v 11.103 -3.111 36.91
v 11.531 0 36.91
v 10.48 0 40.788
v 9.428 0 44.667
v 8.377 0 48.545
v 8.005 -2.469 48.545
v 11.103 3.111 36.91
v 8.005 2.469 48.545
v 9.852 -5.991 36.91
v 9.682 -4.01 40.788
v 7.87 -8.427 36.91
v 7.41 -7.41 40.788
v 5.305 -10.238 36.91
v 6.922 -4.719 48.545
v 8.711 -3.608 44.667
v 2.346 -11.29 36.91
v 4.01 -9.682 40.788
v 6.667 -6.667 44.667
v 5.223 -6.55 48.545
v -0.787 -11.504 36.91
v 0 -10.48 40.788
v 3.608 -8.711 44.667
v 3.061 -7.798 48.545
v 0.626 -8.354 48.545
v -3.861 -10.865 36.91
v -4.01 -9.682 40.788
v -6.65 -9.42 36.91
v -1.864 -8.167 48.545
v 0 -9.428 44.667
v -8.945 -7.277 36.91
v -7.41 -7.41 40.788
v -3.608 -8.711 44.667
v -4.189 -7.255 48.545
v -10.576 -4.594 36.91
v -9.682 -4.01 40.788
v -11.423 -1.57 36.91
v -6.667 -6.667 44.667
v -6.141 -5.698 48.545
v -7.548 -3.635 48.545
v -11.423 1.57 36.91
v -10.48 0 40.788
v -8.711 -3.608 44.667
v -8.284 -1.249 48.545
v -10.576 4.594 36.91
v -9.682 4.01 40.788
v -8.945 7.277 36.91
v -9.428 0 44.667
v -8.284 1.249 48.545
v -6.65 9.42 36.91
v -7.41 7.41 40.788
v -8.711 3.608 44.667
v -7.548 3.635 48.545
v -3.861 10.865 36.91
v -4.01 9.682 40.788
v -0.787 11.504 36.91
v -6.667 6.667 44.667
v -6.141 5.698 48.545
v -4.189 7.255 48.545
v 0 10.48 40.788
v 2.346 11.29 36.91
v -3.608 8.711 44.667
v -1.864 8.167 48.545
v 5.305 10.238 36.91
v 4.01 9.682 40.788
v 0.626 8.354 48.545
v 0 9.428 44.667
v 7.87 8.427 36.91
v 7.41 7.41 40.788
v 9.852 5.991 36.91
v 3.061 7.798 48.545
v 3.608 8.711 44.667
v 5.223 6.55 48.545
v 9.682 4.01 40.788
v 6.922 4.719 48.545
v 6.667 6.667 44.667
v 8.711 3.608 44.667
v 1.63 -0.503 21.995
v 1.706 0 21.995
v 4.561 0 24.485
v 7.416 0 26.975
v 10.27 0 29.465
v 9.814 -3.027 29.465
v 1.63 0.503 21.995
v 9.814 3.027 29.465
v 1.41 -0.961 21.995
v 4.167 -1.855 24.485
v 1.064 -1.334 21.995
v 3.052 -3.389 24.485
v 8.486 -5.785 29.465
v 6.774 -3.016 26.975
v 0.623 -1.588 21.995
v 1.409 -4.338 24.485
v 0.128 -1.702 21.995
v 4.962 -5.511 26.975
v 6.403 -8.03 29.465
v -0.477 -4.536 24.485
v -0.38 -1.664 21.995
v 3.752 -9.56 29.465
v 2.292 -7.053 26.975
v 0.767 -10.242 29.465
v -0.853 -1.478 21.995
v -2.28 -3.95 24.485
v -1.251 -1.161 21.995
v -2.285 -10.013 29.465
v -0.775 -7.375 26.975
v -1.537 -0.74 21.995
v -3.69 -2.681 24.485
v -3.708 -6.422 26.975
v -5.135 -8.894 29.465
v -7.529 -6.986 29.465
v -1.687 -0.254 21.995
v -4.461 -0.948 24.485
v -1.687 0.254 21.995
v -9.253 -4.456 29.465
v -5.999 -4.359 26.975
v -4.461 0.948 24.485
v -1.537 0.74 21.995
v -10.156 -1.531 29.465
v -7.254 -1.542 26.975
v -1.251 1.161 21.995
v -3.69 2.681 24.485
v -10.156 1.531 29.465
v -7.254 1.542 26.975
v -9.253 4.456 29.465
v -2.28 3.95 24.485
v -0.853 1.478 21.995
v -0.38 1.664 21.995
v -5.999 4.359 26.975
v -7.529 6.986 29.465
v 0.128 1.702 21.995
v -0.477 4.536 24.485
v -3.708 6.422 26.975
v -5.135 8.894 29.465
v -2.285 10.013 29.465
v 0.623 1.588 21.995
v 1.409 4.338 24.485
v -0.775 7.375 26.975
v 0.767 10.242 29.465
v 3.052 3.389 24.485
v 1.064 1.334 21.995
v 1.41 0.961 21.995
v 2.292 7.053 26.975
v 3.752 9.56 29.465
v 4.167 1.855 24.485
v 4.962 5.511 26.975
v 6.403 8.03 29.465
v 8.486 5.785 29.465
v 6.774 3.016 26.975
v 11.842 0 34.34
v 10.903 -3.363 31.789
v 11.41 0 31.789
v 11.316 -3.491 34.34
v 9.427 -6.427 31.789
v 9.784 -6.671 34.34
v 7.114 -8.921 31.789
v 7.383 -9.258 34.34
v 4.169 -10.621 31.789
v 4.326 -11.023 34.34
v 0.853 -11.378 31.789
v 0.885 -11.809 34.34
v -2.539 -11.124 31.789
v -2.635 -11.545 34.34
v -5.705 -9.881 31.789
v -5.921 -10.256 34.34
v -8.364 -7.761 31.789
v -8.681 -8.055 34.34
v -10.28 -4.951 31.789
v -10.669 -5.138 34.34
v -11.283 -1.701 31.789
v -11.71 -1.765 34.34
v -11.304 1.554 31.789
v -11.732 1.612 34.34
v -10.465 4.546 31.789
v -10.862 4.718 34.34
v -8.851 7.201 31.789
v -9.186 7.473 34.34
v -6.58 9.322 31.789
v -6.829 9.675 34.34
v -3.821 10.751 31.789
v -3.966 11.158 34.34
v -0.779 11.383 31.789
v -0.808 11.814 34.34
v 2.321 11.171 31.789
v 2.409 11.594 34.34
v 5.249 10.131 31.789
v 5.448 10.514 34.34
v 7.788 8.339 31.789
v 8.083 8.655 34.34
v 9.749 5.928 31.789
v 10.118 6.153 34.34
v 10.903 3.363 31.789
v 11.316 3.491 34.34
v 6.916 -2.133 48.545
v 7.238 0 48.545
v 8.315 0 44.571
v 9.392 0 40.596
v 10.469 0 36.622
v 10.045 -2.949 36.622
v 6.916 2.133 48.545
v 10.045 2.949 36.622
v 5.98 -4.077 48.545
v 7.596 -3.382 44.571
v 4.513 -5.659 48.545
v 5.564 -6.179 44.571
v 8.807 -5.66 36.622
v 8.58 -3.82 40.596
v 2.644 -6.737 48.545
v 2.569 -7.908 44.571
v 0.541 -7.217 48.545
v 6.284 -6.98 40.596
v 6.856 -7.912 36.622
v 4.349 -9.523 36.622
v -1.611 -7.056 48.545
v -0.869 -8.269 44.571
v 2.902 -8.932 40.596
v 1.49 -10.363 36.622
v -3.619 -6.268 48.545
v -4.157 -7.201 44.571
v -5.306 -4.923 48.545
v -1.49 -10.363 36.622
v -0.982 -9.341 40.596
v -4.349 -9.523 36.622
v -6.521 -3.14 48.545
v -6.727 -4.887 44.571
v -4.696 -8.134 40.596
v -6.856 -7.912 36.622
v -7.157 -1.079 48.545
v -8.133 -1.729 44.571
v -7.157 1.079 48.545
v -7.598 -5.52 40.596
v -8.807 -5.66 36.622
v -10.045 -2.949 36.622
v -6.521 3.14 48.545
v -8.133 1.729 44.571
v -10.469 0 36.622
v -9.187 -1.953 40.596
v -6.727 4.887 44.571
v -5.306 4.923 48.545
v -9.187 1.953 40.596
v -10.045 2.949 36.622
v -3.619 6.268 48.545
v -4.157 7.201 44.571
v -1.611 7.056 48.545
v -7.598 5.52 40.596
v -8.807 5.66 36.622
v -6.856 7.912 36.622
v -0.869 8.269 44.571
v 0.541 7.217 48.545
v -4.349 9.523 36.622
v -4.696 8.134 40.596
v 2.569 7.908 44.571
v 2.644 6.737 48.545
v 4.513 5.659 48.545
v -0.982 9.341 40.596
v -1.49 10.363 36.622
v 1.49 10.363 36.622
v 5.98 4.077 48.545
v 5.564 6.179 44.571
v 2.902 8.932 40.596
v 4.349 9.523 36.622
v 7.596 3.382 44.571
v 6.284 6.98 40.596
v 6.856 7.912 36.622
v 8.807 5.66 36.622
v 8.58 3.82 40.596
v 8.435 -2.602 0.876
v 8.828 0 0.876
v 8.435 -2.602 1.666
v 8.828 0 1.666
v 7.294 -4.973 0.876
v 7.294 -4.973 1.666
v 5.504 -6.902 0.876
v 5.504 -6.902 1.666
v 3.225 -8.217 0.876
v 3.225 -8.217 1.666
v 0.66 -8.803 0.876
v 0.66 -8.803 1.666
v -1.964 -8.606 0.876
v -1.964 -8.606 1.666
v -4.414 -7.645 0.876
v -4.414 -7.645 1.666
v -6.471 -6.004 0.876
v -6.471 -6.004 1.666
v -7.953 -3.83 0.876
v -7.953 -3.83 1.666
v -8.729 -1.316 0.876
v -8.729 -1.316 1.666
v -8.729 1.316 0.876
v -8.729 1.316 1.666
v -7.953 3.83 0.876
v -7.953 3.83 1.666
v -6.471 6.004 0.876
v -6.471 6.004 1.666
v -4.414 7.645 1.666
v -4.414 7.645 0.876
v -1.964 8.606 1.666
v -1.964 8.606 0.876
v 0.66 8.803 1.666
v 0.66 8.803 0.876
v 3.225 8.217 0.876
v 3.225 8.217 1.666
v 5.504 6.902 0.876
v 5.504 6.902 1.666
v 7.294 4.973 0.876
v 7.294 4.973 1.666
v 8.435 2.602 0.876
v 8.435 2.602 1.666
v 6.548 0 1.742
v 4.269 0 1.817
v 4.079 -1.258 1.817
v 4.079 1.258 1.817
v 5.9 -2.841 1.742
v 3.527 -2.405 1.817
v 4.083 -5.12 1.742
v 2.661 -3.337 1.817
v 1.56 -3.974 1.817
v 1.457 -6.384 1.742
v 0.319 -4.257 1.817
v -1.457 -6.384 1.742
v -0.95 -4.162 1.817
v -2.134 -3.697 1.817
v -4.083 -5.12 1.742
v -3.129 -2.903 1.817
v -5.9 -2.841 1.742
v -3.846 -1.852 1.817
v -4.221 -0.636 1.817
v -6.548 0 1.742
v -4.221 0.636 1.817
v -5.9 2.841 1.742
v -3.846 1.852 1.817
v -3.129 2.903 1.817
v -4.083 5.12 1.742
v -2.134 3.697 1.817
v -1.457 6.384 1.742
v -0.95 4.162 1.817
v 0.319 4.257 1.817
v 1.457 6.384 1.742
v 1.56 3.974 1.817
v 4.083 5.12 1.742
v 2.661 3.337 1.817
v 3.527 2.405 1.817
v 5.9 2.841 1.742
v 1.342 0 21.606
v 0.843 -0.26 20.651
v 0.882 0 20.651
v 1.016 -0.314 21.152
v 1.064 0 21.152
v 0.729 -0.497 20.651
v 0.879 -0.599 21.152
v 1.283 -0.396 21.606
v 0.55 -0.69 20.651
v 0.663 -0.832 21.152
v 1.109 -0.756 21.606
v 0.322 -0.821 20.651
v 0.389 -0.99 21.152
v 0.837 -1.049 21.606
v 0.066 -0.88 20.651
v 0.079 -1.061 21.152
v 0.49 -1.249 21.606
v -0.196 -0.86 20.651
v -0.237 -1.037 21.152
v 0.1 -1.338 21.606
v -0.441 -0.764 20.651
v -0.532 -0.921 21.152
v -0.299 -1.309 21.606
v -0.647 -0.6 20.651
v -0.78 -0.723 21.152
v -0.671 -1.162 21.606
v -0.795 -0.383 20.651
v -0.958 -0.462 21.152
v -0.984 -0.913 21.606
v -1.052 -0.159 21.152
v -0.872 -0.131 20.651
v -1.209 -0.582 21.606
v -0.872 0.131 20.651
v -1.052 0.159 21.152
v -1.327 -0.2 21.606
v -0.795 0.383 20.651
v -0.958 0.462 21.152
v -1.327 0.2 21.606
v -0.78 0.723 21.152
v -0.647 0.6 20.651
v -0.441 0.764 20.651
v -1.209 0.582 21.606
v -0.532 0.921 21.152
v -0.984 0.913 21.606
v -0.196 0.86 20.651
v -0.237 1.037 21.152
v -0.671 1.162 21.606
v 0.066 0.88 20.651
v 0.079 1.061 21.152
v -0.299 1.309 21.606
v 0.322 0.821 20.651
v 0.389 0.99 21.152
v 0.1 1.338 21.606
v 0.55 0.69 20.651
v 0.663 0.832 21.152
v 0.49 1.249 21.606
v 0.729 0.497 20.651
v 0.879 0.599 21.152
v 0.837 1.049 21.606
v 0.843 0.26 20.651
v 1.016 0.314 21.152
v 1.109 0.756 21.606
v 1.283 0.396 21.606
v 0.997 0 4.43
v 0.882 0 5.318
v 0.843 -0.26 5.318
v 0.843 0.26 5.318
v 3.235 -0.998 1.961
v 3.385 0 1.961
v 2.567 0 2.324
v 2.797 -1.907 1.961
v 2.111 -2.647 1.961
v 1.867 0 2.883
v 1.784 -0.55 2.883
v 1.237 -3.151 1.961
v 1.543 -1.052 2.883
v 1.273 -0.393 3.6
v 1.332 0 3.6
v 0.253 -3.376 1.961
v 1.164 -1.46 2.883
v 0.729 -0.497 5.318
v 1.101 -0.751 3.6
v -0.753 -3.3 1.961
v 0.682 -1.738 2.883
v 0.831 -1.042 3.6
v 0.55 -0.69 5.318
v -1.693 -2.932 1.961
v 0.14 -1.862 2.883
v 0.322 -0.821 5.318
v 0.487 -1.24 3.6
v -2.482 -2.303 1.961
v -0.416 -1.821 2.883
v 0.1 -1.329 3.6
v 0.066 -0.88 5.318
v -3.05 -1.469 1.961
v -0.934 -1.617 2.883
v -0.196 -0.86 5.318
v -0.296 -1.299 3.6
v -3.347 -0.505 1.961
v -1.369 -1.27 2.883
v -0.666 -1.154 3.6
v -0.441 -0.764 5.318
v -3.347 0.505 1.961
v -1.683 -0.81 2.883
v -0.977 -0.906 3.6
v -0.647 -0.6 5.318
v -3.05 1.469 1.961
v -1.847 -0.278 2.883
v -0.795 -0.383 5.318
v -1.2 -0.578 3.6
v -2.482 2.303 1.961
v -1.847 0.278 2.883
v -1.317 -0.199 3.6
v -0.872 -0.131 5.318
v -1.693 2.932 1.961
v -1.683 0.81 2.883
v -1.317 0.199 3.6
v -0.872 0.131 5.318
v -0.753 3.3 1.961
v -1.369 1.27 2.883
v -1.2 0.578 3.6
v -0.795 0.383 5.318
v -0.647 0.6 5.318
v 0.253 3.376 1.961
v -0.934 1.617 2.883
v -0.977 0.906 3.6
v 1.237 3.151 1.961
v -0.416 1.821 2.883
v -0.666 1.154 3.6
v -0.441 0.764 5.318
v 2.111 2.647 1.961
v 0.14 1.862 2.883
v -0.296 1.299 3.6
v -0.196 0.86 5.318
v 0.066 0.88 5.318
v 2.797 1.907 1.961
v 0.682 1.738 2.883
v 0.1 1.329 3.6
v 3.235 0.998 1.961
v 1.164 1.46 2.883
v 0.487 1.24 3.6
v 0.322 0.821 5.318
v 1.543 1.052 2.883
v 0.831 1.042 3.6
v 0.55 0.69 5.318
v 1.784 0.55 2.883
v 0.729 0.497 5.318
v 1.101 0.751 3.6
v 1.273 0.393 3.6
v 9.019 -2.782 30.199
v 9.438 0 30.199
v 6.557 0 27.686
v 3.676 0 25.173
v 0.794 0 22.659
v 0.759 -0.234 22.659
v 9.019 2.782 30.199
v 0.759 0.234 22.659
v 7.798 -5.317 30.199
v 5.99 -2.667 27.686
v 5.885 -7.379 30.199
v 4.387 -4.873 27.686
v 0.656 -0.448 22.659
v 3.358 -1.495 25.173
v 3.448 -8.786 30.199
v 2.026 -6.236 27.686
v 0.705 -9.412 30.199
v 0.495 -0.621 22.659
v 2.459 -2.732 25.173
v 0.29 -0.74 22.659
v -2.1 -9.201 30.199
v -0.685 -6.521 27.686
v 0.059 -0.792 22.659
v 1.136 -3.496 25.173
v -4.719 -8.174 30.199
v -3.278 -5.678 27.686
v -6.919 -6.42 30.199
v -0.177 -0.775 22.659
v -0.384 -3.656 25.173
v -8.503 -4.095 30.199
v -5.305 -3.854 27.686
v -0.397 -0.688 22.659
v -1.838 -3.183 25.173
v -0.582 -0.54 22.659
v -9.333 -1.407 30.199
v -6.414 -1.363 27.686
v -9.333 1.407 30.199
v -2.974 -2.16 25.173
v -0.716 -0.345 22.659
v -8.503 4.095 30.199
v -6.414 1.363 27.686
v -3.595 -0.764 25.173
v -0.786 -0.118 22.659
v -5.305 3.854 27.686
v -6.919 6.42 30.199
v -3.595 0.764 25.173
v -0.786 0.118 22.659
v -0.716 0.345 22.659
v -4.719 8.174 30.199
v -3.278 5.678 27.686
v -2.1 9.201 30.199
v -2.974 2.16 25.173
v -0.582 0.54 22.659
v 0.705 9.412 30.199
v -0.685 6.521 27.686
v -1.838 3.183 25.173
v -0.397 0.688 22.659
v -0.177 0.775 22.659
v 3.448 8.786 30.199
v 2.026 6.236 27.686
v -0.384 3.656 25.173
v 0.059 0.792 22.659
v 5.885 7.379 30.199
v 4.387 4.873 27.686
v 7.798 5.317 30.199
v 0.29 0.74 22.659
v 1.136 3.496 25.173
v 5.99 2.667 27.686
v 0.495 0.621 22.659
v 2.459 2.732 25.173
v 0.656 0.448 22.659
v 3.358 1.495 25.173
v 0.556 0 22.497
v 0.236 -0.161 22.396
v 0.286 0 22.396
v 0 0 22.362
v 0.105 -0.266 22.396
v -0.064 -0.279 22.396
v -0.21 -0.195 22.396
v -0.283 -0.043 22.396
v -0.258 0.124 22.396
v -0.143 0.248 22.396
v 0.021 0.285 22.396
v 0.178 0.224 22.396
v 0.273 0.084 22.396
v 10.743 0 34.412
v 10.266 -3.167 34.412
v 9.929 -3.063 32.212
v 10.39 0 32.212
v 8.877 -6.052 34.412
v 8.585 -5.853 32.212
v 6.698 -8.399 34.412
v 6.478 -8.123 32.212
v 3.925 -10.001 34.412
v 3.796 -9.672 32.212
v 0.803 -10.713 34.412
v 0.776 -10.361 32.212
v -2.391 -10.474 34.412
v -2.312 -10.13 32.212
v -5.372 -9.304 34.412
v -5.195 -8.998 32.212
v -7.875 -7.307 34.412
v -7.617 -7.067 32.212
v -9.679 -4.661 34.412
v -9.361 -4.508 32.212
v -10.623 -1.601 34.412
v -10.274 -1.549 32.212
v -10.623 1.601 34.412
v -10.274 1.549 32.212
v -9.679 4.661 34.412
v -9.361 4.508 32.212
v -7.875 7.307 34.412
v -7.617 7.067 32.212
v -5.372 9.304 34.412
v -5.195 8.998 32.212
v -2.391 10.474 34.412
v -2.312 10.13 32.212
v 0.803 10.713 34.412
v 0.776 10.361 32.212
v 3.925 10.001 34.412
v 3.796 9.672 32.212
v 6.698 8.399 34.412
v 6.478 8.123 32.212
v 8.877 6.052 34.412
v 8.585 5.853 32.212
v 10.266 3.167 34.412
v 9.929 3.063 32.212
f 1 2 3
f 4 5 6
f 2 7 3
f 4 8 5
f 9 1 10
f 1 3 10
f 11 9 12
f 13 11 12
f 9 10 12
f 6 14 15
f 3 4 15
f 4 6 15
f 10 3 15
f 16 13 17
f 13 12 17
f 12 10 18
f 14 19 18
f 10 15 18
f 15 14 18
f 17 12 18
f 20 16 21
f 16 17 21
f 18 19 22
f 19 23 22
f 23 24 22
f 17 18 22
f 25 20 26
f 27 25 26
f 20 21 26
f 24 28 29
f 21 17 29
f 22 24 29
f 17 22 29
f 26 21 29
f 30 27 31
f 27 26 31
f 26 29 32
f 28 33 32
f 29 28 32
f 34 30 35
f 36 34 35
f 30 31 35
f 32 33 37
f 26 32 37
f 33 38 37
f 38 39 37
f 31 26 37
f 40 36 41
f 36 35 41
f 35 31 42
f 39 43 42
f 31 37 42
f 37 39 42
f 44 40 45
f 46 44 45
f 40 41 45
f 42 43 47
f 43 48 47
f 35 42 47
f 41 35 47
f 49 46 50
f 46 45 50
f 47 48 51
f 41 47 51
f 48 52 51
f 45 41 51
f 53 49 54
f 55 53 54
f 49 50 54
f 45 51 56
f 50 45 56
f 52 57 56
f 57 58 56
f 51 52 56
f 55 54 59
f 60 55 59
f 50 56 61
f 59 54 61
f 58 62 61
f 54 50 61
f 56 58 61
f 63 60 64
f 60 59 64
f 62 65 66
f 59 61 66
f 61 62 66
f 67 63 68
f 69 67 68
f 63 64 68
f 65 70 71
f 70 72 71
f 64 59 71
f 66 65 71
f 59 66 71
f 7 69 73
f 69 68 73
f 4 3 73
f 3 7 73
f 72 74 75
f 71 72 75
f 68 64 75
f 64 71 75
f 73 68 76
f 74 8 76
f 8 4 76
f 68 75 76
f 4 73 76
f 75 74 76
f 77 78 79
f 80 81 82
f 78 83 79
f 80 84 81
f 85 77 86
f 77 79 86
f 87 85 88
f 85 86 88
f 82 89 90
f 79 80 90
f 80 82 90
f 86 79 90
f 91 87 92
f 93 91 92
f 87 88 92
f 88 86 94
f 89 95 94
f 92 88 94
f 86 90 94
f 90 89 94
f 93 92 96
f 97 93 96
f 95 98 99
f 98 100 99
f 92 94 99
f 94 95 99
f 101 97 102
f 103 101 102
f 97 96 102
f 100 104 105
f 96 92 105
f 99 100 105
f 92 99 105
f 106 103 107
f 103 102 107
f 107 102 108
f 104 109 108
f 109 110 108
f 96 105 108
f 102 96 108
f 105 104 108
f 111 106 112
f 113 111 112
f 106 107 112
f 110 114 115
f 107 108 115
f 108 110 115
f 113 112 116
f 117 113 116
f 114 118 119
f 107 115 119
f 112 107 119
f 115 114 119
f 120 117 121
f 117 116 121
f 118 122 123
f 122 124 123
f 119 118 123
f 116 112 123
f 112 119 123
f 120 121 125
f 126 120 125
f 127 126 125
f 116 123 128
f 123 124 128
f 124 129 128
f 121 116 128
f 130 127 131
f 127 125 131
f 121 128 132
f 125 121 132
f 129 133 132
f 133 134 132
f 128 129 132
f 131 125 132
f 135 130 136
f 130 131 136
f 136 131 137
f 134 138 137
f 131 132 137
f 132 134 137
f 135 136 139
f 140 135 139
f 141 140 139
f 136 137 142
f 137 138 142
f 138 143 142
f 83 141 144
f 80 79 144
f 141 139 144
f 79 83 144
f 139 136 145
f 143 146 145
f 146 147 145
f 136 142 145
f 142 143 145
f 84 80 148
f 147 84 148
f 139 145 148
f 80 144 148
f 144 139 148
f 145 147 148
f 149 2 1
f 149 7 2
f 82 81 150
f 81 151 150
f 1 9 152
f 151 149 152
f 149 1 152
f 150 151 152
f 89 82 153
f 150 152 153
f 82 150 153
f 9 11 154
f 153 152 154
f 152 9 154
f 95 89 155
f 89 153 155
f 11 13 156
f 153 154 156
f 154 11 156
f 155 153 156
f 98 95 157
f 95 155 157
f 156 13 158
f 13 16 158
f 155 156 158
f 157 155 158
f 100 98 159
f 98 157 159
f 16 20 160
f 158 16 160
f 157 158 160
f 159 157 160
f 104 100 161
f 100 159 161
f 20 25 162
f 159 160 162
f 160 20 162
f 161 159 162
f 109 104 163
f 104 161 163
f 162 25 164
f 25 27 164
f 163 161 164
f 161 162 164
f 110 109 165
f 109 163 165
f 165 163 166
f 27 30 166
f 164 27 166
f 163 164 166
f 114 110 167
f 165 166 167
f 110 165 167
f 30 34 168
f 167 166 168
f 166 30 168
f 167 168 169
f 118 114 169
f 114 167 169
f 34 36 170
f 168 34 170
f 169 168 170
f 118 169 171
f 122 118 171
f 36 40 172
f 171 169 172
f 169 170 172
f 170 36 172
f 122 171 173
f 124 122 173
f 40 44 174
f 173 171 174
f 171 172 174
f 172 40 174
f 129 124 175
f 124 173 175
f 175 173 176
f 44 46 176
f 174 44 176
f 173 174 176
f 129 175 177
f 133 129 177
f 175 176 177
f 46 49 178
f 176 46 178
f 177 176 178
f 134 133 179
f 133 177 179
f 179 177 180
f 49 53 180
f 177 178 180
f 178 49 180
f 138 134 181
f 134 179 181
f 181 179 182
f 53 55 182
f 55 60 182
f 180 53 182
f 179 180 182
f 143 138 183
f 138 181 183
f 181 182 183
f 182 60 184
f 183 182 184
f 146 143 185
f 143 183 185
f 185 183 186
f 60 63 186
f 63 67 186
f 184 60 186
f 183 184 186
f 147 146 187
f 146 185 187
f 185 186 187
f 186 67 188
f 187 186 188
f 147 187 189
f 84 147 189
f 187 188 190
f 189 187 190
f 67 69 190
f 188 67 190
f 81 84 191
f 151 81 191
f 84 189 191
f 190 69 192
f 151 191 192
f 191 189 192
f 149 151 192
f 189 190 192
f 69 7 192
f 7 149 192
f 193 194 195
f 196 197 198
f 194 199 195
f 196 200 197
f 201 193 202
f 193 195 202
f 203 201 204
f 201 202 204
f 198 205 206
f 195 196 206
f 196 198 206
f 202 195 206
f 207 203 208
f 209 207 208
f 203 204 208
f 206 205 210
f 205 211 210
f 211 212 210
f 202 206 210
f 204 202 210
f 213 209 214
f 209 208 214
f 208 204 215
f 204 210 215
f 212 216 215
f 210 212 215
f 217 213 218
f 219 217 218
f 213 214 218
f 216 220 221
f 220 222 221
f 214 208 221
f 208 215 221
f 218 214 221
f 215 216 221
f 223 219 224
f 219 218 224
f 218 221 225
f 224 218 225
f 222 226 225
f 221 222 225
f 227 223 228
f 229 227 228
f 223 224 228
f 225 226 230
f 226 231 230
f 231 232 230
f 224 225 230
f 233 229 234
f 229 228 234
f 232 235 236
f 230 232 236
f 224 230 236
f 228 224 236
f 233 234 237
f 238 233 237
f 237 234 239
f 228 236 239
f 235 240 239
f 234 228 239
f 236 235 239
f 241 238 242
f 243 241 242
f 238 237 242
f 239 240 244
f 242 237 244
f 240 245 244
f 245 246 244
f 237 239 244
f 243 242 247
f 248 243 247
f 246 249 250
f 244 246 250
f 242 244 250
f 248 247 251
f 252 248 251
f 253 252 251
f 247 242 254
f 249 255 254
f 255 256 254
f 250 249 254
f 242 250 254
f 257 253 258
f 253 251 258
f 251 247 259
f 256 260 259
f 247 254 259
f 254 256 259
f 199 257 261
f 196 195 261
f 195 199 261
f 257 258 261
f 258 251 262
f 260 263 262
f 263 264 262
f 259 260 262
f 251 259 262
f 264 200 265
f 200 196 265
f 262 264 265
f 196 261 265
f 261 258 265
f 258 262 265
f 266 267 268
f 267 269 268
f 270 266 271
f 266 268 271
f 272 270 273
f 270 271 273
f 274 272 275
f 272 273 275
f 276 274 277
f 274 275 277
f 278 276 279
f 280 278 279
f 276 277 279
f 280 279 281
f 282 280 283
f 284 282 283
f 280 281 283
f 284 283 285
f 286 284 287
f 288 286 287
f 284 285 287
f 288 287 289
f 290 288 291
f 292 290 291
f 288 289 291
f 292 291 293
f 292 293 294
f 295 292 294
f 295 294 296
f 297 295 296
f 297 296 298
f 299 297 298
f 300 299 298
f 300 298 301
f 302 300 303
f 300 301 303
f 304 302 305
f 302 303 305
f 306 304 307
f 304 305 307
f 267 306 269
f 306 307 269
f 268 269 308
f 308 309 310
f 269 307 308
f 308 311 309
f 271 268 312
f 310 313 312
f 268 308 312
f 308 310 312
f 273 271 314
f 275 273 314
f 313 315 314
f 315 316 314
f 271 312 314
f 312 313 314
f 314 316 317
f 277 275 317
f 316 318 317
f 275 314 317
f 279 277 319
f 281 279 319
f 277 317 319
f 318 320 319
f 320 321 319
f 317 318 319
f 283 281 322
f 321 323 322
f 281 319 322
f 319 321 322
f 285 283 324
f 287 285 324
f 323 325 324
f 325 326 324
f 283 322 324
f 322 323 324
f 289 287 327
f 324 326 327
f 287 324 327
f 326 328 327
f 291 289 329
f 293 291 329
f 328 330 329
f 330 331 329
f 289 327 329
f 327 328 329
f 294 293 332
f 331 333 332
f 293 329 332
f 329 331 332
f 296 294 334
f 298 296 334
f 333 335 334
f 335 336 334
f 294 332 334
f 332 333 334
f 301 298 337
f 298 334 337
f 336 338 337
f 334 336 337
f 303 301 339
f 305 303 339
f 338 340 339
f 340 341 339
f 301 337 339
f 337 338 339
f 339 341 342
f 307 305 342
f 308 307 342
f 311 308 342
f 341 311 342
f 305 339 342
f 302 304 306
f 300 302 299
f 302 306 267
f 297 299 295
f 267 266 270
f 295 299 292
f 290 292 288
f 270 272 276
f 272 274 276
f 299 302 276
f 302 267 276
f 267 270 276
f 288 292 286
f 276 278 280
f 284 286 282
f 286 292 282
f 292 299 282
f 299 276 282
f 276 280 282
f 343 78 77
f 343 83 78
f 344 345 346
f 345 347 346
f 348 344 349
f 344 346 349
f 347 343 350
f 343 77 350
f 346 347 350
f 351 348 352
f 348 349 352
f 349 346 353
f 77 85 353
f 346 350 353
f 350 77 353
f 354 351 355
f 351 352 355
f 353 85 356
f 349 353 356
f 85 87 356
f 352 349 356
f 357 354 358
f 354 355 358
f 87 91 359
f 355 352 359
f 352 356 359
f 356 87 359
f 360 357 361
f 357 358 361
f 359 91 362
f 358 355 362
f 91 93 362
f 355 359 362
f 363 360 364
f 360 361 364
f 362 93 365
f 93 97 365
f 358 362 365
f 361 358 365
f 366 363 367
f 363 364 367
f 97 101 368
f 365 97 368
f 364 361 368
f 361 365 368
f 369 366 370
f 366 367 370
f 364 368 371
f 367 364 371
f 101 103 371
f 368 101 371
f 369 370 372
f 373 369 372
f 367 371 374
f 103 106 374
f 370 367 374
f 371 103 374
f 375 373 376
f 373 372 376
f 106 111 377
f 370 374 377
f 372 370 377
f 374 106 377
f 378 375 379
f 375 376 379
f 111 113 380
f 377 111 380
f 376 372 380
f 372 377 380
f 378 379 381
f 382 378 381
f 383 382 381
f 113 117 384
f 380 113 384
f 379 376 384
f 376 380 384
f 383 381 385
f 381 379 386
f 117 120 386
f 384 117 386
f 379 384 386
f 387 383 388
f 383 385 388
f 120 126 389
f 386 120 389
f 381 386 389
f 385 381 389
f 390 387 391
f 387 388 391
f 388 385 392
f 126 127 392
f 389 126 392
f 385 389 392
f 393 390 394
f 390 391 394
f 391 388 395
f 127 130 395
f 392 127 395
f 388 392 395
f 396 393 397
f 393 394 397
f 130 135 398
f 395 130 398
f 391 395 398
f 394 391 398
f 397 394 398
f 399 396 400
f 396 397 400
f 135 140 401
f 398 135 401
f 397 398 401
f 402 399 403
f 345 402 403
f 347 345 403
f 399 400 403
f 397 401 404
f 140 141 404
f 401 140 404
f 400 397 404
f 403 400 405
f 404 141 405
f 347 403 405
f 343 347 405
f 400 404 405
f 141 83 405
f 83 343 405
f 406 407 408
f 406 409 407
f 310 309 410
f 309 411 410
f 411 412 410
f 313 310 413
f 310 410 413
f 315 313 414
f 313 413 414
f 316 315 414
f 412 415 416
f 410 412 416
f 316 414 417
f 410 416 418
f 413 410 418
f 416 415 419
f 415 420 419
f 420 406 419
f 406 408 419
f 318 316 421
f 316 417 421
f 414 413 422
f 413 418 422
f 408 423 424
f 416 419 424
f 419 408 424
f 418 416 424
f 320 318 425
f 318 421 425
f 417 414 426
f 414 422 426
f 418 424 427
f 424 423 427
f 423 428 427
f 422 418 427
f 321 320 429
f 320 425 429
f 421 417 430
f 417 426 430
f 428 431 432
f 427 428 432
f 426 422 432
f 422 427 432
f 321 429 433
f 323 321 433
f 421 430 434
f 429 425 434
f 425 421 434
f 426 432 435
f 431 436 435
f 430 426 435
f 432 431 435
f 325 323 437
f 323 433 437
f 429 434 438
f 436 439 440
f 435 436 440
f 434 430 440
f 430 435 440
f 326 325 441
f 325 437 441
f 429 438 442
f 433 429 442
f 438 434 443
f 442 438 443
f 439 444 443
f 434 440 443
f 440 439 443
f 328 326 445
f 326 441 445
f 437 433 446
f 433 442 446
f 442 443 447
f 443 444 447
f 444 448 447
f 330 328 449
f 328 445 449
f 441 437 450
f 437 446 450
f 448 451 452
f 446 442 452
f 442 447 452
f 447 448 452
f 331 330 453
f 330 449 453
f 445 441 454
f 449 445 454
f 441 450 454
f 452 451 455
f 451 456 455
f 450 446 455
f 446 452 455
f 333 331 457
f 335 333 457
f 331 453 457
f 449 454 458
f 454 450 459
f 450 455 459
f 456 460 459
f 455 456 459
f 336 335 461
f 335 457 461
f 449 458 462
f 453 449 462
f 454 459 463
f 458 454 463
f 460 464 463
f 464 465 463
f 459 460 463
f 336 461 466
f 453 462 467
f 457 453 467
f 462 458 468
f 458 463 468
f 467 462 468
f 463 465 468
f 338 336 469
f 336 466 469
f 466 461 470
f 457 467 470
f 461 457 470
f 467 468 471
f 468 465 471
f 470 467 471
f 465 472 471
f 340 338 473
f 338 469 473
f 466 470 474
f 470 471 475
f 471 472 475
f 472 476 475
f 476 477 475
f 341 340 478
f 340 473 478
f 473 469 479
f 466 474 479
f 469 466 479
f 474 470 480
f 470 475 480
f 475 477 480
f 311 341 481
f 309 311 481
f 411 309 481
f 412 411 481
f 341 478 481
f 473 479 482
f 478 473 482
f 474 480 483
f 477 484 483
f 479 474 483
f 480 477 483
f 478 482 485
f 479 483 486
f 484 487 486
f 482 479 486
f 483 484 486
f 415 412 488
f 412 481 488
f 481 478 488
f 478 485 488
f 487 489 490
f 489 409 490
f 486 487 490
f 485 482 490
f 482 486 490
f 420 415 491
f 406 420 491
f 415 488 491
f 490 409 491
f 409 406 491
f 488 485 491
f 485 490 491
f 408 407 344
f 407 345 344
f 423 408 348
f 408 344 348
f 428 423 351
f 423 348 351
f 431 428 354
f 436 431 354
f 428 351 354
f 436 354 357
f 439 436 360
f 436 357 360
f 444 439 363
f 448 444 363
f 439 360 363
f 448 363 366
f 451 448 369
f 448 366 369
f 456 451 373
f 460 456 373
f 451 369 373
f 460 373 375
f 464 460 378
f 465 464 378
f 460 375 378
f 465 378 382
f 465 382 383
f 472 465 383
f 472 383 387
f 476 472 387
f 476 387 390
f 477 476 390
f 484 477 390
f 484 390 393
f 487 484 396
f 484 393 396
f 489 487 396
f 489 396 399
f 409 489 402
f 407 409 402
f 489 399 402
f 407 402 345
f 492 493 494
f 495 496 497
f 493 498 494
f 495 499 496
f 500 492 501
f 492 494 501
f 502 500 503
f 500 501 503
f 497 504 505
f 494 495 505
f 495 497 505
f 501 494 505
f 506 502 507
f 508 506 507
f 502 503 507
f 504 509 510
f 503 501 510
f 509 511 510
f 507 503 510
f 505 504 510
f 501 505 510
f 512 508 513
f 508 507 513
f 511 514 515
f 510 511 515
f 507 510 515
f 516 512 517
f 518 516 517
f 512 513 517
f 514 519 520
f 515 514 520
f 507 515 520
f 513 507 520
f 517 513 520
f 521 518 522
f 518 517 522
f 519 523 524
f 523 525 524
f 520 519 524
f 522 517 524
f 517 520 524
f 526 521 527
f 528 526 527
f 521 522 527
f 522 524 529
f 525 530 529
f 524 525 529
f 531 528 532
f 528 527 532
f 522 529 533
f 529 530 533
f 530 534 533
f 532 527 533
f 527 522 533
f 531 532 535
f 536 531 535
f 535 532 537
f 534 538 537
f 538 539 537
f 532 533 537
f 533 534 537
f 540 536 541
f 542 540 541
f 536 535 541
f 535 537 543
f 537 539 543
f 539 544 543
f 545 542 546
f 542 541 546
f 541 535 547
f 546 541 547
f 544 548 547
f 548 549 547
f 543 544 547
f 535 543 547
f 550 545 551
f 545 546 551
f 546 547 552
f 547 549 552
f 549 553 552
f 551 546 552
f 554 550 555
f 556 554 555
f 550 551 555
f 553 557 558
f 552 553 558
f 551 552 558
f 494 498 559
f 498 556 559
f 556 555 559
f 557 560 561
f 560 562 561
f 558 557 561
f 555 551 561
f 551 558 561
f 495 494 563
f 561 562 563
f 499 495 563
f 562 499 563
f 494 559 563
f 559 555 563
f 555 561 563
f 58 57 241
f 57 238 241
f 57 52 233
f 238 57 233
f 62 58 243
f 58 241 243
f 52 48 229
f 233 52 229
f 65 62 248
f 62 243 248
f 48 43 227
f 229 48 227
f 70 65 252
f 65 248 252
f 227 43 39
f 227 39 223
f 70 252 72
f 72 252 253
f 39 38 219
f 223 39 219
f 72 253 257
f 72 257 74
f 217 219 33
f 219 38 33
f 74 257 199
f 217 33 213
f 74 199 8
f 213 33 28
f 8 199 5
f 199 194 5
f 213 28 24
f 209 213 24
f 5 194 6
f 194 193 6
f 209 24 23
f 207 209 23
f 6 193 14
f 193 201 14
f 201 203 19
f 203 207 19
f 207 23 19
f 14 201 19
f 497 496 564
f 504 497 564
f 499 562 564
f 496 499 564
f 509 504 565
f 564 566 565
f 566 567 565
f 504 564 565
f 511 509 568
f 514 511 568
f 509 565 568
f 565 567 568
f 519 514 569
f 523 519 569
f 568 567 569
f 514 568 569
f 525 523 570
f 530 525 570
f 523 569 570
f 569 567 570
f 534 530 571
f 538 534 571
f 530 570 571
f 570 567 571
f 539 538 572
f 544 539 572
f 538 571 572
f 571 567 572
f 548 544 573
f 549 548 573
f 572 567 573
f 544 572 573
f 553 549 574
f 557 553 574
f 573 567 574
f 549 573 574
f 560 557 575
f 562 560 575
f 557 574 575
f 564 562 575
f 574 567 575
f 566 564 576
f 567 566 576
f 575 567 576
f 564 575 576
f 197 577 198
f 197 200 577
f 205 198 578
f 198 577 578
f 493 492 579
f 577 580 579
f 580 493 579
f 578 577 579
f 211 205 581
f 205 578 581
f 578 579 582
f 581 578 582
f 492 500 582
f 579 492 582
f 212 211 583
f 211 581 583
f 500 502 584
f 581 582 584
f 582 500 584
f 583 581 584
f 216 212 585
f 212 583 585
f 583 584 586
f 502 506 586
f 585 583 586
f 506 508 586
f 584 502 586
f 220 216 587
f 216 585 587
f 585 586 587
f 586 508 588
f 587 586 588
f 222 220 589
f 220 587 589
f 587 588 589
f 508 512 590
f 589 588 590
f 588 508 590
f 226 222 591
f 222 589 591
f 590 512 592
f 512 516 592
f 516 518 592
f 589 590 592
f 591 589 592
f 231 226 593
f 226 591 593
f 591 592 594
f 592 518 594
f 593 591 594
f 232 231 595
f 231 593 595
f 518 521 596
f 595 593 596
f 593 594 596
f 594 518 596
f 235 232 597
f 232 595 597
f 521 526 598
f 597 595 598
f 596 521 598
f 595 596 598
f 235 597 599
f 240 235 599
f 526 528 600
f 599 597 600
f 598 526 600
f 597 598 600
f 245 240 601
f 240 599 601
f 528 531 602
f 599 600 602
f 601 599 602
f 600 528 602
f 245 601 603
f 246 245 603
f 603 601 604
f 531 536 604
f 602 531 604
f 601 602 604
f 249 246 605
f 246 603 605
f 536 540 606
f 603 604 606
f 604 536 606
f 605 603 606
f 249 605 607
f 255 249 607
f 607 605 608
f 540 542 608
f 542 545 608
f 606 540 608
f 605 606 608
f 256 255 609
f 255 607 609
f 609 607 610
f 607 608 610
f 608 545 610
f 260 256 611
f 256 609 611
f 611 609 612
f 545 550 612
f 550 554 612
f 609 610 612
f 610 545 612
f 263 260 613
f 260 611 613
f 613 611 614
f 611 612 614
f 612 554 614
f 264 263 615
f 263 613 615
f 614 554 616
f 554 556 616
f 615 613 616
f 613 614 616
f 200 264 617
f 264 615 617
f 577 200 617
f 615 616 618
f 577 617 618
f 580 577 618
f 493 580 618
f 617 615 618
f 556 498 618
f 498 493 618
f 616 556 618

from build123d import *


with BuildPart() as f1:
    # F0 (on Front) → F1 (revolve)
    with BuildSketch(Plane.XZ):
        with BuildLine():
            Line((11.530839, 36.909778), (8.377308, 48.545218))
            Line((8.377308, 48.545218), (7.237623, 48.545218))
            Line((7.237623, 48.545218), (10.469142, 36.622028))
            ThreePointArc((10.469142, 36.622028), (10.644584, 33.299521), (9.438111, 30.198835))
            Line((9.438111, 30.198835), (0.794426, 22.659409))
            ThreePointArc((0.794426, 22.659409), (0.424202, 22.438515), (0, 22.361623))
            Line((0, 22.361623), (0, 0.875514))
            Line((0, 0.875514), (8.827639, 0.875514))
            Line((8.827639, 0.875514), (8.827639, 1.66595))
            Line((8.827639, 1.66595), (4.268712, 1.817272))
            ThreePointArc((4.268712, 1.817272), (1.867439, 2.882665), (0.882294, 5.317959))
            Line((0.882294, 5.317959), (0.882294, 20.650616))
            ThreePointArc((0.882294, 20.650616), (1.191417, 21.38592), (1.706291, 21.995127))
            Line((1.706291, 21.995127), (10.27026, 29.465022))
            ThreePointArc((10.27026, 29.465022), (11.718112, 33.048966), (11.530839, 36.909778))
        make_face()
    revolve(axis=Axis((0, 0, 23.284463), (0, 0, -1)))


solid = f1.part
